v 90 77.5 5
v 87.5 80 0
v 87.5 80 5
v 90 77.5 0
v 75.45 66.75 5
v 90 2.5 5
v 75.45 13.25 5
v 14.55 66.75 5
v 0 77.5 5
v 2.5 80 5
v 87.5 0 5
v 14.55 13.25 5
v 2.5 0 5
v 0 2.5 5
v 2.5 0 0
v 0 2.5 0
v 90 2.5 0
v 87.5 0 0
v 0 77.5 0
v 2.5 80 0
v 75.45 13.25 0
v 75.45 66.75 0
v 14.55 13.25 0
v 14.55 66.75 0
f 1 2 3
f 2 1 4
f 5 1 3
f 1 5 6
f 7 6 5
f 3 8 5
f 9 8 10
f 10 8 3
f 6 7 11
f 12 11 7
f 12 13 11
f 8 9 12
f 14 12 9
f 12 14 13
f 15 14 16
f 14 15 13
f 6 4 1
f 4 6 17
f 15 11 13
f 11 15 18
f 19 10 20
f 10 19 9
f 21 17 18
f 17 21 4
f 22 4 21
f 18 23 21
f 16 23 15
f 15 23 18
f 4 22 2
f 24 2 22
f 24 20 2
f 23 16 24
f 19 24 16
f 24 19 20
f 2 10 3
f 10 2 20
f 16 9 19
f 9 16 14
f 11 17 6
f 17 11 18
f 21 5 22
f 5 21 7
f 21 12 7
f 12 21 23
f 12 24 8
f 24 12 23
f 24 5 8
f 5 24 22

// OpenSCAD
$fn = 32;

// ----------------------------------------------------------------------
// Windowed plate: 1 voids, 90 x 80 x 5 mm
// ----------------------------------------------------------------------

// --- parameters (mm) ---
plate_l = 90;             // plate length, X
plate_w = 80;             // plate width, Y
plate_t = 5;              // plate thickness, Z
edge_margin = 8;          // wall from the plate edge to any window
win1_l = 60.9;            // window length
win1_w = 53.5;            // window width
depth_1 = 5;              // depth of void 1 (full thickness = through)
corner_c = 2.5;           // corner chamfer of the plate
fit_tol = 0.05;           // declared fit tolerance (prompt contract)
free_tol = 0.3;           // declared free tolerance (prompt contract)

profile = [[2.5, 0], [87.5, 0], [90, 2.5], [90, 77.5], [87.5, 80], [2.5, 80], [0, 77.5], [0, 2.5]];  // primary outline, 8 points, counter clockwise
void_1 = [[14.55, 13.25], [75.45, 13.25], [75.45, 66.75], [14.55, 66.75]];  // large central window, 4 points

// --- the one profile operation ---
difference() {
  linear_extrude(height = plate_t) polygon(points = profile);
  translate([0, 0, -1])
    linear_extrude(height = plate_t + 2) polygon(points = void_1);
}
